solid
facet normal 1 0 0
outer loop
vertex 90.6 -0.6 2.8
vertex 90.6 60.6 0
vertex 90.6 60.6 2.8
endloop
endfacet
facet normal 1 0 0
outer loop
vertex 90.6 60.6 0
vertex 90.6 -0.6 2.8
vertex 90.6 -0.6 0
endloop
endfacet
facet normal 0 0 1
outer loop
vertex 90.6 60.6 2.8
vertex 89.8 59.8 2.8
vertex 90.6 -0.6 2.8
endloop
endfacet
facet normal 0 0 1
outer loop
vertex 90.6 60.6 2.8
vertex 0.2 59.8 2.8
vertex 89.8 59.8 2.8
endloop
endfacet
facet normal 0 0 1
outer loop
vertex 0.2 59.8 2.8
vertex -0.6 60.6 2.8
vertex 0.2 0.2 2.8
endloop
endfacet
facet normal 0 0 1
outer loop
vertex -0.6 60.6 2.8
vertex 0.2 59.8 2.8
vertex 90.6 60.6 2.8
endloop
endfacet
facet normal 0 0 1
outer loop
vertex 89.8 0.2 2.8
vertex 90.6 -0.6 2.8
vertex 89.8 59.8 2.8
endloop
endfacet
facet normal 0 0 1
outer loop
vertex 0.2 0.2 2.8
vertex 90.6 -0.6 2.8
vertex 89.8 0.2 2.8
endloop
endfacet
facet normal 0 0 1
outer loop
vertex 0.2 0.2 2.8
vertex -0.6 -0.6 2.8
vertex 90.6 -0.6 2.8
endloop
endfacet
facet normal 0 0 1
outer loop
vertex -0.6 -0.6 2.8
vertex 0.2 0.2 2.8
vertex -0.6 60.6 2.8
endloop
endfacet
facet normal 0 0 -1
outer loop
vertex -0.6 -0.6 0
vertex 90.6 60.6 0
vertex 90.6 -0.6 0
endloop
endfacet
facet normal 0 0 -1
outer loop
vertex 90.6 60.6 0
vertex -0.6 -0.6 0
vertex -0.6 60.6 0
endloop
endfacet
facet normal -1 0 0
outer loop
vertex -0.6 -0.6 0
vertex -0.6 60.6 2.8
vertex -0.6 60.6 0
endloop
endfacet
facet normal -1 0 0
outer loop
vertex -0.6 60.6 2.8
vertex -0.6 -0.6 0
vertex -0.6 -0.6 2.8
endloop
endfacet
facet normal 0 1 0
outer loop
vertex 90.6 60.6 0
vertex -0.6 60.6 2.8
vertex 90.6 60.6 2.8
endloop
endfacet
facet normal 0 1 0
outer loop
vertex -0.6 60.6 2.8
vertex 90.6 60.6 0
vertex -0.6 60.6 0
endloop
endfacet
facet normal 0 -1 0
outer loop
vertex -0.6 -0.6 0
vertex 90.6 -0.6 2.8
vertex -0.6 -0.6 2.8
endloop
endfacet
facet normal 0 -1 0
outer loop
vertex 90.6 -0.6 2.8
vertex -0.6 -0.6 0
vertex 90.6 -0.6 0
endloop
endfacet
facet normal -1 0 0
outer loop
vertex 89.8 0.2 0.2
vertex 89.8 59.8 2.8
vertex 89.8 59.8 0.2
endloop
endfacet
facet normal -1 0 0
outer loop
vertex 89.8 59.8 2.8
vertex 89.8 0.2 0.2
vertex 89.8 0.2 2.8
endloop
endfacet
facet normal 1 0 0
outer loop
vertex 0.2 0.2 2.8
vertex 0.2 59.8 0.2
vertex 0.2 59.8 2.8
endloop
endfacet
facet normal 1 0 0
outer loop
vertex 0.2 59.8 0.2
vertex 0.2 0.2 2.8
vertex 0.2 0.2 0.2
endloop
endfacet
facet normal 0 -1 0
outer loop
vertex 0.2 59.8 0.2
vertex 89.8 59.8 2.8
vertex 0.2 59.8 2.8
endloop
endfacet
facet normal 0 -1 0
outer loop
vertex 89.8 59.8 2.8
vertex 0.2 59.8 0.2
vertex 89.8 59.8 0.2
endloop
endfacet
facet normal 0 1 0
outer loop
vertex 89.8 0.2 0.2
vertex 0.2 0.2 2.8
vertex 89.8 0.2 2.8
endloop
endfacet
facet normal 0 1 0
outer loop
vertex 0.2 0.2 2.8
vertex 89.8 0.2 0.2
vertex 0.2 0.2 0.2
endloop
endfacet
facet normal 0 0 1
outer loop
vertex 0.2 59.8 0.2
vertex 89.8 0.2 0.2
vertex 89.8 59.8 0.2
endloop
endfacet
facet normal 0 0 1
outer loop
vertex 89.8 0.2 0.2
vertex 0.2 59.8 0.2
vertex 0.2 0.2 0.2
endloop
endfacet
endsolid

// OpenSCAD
// source image
image="img.png";

// lithophane height
H = 2.6;

// dimensions
L = 90;
W = 60;

// border width
T = 1.2;

// bottom height
O = 0.2;

// border inset
C = 0.4;

// scale of image
S = 0.5;

module frame() {
    difference() {
        translate([-T/2, -T/2, 0])
            cube([L+T, W+T, H + O]);
        translate([C/2, C/2, 0])
            cube([L-C, W-C, H+O*2]);
    }
    
        cube([L, W, O]);
}

translate([L/2, W/2, O])
scale([S, S, H/100])
    surface(file = image, center = true, invert = false, convexity = 5);


frame();
